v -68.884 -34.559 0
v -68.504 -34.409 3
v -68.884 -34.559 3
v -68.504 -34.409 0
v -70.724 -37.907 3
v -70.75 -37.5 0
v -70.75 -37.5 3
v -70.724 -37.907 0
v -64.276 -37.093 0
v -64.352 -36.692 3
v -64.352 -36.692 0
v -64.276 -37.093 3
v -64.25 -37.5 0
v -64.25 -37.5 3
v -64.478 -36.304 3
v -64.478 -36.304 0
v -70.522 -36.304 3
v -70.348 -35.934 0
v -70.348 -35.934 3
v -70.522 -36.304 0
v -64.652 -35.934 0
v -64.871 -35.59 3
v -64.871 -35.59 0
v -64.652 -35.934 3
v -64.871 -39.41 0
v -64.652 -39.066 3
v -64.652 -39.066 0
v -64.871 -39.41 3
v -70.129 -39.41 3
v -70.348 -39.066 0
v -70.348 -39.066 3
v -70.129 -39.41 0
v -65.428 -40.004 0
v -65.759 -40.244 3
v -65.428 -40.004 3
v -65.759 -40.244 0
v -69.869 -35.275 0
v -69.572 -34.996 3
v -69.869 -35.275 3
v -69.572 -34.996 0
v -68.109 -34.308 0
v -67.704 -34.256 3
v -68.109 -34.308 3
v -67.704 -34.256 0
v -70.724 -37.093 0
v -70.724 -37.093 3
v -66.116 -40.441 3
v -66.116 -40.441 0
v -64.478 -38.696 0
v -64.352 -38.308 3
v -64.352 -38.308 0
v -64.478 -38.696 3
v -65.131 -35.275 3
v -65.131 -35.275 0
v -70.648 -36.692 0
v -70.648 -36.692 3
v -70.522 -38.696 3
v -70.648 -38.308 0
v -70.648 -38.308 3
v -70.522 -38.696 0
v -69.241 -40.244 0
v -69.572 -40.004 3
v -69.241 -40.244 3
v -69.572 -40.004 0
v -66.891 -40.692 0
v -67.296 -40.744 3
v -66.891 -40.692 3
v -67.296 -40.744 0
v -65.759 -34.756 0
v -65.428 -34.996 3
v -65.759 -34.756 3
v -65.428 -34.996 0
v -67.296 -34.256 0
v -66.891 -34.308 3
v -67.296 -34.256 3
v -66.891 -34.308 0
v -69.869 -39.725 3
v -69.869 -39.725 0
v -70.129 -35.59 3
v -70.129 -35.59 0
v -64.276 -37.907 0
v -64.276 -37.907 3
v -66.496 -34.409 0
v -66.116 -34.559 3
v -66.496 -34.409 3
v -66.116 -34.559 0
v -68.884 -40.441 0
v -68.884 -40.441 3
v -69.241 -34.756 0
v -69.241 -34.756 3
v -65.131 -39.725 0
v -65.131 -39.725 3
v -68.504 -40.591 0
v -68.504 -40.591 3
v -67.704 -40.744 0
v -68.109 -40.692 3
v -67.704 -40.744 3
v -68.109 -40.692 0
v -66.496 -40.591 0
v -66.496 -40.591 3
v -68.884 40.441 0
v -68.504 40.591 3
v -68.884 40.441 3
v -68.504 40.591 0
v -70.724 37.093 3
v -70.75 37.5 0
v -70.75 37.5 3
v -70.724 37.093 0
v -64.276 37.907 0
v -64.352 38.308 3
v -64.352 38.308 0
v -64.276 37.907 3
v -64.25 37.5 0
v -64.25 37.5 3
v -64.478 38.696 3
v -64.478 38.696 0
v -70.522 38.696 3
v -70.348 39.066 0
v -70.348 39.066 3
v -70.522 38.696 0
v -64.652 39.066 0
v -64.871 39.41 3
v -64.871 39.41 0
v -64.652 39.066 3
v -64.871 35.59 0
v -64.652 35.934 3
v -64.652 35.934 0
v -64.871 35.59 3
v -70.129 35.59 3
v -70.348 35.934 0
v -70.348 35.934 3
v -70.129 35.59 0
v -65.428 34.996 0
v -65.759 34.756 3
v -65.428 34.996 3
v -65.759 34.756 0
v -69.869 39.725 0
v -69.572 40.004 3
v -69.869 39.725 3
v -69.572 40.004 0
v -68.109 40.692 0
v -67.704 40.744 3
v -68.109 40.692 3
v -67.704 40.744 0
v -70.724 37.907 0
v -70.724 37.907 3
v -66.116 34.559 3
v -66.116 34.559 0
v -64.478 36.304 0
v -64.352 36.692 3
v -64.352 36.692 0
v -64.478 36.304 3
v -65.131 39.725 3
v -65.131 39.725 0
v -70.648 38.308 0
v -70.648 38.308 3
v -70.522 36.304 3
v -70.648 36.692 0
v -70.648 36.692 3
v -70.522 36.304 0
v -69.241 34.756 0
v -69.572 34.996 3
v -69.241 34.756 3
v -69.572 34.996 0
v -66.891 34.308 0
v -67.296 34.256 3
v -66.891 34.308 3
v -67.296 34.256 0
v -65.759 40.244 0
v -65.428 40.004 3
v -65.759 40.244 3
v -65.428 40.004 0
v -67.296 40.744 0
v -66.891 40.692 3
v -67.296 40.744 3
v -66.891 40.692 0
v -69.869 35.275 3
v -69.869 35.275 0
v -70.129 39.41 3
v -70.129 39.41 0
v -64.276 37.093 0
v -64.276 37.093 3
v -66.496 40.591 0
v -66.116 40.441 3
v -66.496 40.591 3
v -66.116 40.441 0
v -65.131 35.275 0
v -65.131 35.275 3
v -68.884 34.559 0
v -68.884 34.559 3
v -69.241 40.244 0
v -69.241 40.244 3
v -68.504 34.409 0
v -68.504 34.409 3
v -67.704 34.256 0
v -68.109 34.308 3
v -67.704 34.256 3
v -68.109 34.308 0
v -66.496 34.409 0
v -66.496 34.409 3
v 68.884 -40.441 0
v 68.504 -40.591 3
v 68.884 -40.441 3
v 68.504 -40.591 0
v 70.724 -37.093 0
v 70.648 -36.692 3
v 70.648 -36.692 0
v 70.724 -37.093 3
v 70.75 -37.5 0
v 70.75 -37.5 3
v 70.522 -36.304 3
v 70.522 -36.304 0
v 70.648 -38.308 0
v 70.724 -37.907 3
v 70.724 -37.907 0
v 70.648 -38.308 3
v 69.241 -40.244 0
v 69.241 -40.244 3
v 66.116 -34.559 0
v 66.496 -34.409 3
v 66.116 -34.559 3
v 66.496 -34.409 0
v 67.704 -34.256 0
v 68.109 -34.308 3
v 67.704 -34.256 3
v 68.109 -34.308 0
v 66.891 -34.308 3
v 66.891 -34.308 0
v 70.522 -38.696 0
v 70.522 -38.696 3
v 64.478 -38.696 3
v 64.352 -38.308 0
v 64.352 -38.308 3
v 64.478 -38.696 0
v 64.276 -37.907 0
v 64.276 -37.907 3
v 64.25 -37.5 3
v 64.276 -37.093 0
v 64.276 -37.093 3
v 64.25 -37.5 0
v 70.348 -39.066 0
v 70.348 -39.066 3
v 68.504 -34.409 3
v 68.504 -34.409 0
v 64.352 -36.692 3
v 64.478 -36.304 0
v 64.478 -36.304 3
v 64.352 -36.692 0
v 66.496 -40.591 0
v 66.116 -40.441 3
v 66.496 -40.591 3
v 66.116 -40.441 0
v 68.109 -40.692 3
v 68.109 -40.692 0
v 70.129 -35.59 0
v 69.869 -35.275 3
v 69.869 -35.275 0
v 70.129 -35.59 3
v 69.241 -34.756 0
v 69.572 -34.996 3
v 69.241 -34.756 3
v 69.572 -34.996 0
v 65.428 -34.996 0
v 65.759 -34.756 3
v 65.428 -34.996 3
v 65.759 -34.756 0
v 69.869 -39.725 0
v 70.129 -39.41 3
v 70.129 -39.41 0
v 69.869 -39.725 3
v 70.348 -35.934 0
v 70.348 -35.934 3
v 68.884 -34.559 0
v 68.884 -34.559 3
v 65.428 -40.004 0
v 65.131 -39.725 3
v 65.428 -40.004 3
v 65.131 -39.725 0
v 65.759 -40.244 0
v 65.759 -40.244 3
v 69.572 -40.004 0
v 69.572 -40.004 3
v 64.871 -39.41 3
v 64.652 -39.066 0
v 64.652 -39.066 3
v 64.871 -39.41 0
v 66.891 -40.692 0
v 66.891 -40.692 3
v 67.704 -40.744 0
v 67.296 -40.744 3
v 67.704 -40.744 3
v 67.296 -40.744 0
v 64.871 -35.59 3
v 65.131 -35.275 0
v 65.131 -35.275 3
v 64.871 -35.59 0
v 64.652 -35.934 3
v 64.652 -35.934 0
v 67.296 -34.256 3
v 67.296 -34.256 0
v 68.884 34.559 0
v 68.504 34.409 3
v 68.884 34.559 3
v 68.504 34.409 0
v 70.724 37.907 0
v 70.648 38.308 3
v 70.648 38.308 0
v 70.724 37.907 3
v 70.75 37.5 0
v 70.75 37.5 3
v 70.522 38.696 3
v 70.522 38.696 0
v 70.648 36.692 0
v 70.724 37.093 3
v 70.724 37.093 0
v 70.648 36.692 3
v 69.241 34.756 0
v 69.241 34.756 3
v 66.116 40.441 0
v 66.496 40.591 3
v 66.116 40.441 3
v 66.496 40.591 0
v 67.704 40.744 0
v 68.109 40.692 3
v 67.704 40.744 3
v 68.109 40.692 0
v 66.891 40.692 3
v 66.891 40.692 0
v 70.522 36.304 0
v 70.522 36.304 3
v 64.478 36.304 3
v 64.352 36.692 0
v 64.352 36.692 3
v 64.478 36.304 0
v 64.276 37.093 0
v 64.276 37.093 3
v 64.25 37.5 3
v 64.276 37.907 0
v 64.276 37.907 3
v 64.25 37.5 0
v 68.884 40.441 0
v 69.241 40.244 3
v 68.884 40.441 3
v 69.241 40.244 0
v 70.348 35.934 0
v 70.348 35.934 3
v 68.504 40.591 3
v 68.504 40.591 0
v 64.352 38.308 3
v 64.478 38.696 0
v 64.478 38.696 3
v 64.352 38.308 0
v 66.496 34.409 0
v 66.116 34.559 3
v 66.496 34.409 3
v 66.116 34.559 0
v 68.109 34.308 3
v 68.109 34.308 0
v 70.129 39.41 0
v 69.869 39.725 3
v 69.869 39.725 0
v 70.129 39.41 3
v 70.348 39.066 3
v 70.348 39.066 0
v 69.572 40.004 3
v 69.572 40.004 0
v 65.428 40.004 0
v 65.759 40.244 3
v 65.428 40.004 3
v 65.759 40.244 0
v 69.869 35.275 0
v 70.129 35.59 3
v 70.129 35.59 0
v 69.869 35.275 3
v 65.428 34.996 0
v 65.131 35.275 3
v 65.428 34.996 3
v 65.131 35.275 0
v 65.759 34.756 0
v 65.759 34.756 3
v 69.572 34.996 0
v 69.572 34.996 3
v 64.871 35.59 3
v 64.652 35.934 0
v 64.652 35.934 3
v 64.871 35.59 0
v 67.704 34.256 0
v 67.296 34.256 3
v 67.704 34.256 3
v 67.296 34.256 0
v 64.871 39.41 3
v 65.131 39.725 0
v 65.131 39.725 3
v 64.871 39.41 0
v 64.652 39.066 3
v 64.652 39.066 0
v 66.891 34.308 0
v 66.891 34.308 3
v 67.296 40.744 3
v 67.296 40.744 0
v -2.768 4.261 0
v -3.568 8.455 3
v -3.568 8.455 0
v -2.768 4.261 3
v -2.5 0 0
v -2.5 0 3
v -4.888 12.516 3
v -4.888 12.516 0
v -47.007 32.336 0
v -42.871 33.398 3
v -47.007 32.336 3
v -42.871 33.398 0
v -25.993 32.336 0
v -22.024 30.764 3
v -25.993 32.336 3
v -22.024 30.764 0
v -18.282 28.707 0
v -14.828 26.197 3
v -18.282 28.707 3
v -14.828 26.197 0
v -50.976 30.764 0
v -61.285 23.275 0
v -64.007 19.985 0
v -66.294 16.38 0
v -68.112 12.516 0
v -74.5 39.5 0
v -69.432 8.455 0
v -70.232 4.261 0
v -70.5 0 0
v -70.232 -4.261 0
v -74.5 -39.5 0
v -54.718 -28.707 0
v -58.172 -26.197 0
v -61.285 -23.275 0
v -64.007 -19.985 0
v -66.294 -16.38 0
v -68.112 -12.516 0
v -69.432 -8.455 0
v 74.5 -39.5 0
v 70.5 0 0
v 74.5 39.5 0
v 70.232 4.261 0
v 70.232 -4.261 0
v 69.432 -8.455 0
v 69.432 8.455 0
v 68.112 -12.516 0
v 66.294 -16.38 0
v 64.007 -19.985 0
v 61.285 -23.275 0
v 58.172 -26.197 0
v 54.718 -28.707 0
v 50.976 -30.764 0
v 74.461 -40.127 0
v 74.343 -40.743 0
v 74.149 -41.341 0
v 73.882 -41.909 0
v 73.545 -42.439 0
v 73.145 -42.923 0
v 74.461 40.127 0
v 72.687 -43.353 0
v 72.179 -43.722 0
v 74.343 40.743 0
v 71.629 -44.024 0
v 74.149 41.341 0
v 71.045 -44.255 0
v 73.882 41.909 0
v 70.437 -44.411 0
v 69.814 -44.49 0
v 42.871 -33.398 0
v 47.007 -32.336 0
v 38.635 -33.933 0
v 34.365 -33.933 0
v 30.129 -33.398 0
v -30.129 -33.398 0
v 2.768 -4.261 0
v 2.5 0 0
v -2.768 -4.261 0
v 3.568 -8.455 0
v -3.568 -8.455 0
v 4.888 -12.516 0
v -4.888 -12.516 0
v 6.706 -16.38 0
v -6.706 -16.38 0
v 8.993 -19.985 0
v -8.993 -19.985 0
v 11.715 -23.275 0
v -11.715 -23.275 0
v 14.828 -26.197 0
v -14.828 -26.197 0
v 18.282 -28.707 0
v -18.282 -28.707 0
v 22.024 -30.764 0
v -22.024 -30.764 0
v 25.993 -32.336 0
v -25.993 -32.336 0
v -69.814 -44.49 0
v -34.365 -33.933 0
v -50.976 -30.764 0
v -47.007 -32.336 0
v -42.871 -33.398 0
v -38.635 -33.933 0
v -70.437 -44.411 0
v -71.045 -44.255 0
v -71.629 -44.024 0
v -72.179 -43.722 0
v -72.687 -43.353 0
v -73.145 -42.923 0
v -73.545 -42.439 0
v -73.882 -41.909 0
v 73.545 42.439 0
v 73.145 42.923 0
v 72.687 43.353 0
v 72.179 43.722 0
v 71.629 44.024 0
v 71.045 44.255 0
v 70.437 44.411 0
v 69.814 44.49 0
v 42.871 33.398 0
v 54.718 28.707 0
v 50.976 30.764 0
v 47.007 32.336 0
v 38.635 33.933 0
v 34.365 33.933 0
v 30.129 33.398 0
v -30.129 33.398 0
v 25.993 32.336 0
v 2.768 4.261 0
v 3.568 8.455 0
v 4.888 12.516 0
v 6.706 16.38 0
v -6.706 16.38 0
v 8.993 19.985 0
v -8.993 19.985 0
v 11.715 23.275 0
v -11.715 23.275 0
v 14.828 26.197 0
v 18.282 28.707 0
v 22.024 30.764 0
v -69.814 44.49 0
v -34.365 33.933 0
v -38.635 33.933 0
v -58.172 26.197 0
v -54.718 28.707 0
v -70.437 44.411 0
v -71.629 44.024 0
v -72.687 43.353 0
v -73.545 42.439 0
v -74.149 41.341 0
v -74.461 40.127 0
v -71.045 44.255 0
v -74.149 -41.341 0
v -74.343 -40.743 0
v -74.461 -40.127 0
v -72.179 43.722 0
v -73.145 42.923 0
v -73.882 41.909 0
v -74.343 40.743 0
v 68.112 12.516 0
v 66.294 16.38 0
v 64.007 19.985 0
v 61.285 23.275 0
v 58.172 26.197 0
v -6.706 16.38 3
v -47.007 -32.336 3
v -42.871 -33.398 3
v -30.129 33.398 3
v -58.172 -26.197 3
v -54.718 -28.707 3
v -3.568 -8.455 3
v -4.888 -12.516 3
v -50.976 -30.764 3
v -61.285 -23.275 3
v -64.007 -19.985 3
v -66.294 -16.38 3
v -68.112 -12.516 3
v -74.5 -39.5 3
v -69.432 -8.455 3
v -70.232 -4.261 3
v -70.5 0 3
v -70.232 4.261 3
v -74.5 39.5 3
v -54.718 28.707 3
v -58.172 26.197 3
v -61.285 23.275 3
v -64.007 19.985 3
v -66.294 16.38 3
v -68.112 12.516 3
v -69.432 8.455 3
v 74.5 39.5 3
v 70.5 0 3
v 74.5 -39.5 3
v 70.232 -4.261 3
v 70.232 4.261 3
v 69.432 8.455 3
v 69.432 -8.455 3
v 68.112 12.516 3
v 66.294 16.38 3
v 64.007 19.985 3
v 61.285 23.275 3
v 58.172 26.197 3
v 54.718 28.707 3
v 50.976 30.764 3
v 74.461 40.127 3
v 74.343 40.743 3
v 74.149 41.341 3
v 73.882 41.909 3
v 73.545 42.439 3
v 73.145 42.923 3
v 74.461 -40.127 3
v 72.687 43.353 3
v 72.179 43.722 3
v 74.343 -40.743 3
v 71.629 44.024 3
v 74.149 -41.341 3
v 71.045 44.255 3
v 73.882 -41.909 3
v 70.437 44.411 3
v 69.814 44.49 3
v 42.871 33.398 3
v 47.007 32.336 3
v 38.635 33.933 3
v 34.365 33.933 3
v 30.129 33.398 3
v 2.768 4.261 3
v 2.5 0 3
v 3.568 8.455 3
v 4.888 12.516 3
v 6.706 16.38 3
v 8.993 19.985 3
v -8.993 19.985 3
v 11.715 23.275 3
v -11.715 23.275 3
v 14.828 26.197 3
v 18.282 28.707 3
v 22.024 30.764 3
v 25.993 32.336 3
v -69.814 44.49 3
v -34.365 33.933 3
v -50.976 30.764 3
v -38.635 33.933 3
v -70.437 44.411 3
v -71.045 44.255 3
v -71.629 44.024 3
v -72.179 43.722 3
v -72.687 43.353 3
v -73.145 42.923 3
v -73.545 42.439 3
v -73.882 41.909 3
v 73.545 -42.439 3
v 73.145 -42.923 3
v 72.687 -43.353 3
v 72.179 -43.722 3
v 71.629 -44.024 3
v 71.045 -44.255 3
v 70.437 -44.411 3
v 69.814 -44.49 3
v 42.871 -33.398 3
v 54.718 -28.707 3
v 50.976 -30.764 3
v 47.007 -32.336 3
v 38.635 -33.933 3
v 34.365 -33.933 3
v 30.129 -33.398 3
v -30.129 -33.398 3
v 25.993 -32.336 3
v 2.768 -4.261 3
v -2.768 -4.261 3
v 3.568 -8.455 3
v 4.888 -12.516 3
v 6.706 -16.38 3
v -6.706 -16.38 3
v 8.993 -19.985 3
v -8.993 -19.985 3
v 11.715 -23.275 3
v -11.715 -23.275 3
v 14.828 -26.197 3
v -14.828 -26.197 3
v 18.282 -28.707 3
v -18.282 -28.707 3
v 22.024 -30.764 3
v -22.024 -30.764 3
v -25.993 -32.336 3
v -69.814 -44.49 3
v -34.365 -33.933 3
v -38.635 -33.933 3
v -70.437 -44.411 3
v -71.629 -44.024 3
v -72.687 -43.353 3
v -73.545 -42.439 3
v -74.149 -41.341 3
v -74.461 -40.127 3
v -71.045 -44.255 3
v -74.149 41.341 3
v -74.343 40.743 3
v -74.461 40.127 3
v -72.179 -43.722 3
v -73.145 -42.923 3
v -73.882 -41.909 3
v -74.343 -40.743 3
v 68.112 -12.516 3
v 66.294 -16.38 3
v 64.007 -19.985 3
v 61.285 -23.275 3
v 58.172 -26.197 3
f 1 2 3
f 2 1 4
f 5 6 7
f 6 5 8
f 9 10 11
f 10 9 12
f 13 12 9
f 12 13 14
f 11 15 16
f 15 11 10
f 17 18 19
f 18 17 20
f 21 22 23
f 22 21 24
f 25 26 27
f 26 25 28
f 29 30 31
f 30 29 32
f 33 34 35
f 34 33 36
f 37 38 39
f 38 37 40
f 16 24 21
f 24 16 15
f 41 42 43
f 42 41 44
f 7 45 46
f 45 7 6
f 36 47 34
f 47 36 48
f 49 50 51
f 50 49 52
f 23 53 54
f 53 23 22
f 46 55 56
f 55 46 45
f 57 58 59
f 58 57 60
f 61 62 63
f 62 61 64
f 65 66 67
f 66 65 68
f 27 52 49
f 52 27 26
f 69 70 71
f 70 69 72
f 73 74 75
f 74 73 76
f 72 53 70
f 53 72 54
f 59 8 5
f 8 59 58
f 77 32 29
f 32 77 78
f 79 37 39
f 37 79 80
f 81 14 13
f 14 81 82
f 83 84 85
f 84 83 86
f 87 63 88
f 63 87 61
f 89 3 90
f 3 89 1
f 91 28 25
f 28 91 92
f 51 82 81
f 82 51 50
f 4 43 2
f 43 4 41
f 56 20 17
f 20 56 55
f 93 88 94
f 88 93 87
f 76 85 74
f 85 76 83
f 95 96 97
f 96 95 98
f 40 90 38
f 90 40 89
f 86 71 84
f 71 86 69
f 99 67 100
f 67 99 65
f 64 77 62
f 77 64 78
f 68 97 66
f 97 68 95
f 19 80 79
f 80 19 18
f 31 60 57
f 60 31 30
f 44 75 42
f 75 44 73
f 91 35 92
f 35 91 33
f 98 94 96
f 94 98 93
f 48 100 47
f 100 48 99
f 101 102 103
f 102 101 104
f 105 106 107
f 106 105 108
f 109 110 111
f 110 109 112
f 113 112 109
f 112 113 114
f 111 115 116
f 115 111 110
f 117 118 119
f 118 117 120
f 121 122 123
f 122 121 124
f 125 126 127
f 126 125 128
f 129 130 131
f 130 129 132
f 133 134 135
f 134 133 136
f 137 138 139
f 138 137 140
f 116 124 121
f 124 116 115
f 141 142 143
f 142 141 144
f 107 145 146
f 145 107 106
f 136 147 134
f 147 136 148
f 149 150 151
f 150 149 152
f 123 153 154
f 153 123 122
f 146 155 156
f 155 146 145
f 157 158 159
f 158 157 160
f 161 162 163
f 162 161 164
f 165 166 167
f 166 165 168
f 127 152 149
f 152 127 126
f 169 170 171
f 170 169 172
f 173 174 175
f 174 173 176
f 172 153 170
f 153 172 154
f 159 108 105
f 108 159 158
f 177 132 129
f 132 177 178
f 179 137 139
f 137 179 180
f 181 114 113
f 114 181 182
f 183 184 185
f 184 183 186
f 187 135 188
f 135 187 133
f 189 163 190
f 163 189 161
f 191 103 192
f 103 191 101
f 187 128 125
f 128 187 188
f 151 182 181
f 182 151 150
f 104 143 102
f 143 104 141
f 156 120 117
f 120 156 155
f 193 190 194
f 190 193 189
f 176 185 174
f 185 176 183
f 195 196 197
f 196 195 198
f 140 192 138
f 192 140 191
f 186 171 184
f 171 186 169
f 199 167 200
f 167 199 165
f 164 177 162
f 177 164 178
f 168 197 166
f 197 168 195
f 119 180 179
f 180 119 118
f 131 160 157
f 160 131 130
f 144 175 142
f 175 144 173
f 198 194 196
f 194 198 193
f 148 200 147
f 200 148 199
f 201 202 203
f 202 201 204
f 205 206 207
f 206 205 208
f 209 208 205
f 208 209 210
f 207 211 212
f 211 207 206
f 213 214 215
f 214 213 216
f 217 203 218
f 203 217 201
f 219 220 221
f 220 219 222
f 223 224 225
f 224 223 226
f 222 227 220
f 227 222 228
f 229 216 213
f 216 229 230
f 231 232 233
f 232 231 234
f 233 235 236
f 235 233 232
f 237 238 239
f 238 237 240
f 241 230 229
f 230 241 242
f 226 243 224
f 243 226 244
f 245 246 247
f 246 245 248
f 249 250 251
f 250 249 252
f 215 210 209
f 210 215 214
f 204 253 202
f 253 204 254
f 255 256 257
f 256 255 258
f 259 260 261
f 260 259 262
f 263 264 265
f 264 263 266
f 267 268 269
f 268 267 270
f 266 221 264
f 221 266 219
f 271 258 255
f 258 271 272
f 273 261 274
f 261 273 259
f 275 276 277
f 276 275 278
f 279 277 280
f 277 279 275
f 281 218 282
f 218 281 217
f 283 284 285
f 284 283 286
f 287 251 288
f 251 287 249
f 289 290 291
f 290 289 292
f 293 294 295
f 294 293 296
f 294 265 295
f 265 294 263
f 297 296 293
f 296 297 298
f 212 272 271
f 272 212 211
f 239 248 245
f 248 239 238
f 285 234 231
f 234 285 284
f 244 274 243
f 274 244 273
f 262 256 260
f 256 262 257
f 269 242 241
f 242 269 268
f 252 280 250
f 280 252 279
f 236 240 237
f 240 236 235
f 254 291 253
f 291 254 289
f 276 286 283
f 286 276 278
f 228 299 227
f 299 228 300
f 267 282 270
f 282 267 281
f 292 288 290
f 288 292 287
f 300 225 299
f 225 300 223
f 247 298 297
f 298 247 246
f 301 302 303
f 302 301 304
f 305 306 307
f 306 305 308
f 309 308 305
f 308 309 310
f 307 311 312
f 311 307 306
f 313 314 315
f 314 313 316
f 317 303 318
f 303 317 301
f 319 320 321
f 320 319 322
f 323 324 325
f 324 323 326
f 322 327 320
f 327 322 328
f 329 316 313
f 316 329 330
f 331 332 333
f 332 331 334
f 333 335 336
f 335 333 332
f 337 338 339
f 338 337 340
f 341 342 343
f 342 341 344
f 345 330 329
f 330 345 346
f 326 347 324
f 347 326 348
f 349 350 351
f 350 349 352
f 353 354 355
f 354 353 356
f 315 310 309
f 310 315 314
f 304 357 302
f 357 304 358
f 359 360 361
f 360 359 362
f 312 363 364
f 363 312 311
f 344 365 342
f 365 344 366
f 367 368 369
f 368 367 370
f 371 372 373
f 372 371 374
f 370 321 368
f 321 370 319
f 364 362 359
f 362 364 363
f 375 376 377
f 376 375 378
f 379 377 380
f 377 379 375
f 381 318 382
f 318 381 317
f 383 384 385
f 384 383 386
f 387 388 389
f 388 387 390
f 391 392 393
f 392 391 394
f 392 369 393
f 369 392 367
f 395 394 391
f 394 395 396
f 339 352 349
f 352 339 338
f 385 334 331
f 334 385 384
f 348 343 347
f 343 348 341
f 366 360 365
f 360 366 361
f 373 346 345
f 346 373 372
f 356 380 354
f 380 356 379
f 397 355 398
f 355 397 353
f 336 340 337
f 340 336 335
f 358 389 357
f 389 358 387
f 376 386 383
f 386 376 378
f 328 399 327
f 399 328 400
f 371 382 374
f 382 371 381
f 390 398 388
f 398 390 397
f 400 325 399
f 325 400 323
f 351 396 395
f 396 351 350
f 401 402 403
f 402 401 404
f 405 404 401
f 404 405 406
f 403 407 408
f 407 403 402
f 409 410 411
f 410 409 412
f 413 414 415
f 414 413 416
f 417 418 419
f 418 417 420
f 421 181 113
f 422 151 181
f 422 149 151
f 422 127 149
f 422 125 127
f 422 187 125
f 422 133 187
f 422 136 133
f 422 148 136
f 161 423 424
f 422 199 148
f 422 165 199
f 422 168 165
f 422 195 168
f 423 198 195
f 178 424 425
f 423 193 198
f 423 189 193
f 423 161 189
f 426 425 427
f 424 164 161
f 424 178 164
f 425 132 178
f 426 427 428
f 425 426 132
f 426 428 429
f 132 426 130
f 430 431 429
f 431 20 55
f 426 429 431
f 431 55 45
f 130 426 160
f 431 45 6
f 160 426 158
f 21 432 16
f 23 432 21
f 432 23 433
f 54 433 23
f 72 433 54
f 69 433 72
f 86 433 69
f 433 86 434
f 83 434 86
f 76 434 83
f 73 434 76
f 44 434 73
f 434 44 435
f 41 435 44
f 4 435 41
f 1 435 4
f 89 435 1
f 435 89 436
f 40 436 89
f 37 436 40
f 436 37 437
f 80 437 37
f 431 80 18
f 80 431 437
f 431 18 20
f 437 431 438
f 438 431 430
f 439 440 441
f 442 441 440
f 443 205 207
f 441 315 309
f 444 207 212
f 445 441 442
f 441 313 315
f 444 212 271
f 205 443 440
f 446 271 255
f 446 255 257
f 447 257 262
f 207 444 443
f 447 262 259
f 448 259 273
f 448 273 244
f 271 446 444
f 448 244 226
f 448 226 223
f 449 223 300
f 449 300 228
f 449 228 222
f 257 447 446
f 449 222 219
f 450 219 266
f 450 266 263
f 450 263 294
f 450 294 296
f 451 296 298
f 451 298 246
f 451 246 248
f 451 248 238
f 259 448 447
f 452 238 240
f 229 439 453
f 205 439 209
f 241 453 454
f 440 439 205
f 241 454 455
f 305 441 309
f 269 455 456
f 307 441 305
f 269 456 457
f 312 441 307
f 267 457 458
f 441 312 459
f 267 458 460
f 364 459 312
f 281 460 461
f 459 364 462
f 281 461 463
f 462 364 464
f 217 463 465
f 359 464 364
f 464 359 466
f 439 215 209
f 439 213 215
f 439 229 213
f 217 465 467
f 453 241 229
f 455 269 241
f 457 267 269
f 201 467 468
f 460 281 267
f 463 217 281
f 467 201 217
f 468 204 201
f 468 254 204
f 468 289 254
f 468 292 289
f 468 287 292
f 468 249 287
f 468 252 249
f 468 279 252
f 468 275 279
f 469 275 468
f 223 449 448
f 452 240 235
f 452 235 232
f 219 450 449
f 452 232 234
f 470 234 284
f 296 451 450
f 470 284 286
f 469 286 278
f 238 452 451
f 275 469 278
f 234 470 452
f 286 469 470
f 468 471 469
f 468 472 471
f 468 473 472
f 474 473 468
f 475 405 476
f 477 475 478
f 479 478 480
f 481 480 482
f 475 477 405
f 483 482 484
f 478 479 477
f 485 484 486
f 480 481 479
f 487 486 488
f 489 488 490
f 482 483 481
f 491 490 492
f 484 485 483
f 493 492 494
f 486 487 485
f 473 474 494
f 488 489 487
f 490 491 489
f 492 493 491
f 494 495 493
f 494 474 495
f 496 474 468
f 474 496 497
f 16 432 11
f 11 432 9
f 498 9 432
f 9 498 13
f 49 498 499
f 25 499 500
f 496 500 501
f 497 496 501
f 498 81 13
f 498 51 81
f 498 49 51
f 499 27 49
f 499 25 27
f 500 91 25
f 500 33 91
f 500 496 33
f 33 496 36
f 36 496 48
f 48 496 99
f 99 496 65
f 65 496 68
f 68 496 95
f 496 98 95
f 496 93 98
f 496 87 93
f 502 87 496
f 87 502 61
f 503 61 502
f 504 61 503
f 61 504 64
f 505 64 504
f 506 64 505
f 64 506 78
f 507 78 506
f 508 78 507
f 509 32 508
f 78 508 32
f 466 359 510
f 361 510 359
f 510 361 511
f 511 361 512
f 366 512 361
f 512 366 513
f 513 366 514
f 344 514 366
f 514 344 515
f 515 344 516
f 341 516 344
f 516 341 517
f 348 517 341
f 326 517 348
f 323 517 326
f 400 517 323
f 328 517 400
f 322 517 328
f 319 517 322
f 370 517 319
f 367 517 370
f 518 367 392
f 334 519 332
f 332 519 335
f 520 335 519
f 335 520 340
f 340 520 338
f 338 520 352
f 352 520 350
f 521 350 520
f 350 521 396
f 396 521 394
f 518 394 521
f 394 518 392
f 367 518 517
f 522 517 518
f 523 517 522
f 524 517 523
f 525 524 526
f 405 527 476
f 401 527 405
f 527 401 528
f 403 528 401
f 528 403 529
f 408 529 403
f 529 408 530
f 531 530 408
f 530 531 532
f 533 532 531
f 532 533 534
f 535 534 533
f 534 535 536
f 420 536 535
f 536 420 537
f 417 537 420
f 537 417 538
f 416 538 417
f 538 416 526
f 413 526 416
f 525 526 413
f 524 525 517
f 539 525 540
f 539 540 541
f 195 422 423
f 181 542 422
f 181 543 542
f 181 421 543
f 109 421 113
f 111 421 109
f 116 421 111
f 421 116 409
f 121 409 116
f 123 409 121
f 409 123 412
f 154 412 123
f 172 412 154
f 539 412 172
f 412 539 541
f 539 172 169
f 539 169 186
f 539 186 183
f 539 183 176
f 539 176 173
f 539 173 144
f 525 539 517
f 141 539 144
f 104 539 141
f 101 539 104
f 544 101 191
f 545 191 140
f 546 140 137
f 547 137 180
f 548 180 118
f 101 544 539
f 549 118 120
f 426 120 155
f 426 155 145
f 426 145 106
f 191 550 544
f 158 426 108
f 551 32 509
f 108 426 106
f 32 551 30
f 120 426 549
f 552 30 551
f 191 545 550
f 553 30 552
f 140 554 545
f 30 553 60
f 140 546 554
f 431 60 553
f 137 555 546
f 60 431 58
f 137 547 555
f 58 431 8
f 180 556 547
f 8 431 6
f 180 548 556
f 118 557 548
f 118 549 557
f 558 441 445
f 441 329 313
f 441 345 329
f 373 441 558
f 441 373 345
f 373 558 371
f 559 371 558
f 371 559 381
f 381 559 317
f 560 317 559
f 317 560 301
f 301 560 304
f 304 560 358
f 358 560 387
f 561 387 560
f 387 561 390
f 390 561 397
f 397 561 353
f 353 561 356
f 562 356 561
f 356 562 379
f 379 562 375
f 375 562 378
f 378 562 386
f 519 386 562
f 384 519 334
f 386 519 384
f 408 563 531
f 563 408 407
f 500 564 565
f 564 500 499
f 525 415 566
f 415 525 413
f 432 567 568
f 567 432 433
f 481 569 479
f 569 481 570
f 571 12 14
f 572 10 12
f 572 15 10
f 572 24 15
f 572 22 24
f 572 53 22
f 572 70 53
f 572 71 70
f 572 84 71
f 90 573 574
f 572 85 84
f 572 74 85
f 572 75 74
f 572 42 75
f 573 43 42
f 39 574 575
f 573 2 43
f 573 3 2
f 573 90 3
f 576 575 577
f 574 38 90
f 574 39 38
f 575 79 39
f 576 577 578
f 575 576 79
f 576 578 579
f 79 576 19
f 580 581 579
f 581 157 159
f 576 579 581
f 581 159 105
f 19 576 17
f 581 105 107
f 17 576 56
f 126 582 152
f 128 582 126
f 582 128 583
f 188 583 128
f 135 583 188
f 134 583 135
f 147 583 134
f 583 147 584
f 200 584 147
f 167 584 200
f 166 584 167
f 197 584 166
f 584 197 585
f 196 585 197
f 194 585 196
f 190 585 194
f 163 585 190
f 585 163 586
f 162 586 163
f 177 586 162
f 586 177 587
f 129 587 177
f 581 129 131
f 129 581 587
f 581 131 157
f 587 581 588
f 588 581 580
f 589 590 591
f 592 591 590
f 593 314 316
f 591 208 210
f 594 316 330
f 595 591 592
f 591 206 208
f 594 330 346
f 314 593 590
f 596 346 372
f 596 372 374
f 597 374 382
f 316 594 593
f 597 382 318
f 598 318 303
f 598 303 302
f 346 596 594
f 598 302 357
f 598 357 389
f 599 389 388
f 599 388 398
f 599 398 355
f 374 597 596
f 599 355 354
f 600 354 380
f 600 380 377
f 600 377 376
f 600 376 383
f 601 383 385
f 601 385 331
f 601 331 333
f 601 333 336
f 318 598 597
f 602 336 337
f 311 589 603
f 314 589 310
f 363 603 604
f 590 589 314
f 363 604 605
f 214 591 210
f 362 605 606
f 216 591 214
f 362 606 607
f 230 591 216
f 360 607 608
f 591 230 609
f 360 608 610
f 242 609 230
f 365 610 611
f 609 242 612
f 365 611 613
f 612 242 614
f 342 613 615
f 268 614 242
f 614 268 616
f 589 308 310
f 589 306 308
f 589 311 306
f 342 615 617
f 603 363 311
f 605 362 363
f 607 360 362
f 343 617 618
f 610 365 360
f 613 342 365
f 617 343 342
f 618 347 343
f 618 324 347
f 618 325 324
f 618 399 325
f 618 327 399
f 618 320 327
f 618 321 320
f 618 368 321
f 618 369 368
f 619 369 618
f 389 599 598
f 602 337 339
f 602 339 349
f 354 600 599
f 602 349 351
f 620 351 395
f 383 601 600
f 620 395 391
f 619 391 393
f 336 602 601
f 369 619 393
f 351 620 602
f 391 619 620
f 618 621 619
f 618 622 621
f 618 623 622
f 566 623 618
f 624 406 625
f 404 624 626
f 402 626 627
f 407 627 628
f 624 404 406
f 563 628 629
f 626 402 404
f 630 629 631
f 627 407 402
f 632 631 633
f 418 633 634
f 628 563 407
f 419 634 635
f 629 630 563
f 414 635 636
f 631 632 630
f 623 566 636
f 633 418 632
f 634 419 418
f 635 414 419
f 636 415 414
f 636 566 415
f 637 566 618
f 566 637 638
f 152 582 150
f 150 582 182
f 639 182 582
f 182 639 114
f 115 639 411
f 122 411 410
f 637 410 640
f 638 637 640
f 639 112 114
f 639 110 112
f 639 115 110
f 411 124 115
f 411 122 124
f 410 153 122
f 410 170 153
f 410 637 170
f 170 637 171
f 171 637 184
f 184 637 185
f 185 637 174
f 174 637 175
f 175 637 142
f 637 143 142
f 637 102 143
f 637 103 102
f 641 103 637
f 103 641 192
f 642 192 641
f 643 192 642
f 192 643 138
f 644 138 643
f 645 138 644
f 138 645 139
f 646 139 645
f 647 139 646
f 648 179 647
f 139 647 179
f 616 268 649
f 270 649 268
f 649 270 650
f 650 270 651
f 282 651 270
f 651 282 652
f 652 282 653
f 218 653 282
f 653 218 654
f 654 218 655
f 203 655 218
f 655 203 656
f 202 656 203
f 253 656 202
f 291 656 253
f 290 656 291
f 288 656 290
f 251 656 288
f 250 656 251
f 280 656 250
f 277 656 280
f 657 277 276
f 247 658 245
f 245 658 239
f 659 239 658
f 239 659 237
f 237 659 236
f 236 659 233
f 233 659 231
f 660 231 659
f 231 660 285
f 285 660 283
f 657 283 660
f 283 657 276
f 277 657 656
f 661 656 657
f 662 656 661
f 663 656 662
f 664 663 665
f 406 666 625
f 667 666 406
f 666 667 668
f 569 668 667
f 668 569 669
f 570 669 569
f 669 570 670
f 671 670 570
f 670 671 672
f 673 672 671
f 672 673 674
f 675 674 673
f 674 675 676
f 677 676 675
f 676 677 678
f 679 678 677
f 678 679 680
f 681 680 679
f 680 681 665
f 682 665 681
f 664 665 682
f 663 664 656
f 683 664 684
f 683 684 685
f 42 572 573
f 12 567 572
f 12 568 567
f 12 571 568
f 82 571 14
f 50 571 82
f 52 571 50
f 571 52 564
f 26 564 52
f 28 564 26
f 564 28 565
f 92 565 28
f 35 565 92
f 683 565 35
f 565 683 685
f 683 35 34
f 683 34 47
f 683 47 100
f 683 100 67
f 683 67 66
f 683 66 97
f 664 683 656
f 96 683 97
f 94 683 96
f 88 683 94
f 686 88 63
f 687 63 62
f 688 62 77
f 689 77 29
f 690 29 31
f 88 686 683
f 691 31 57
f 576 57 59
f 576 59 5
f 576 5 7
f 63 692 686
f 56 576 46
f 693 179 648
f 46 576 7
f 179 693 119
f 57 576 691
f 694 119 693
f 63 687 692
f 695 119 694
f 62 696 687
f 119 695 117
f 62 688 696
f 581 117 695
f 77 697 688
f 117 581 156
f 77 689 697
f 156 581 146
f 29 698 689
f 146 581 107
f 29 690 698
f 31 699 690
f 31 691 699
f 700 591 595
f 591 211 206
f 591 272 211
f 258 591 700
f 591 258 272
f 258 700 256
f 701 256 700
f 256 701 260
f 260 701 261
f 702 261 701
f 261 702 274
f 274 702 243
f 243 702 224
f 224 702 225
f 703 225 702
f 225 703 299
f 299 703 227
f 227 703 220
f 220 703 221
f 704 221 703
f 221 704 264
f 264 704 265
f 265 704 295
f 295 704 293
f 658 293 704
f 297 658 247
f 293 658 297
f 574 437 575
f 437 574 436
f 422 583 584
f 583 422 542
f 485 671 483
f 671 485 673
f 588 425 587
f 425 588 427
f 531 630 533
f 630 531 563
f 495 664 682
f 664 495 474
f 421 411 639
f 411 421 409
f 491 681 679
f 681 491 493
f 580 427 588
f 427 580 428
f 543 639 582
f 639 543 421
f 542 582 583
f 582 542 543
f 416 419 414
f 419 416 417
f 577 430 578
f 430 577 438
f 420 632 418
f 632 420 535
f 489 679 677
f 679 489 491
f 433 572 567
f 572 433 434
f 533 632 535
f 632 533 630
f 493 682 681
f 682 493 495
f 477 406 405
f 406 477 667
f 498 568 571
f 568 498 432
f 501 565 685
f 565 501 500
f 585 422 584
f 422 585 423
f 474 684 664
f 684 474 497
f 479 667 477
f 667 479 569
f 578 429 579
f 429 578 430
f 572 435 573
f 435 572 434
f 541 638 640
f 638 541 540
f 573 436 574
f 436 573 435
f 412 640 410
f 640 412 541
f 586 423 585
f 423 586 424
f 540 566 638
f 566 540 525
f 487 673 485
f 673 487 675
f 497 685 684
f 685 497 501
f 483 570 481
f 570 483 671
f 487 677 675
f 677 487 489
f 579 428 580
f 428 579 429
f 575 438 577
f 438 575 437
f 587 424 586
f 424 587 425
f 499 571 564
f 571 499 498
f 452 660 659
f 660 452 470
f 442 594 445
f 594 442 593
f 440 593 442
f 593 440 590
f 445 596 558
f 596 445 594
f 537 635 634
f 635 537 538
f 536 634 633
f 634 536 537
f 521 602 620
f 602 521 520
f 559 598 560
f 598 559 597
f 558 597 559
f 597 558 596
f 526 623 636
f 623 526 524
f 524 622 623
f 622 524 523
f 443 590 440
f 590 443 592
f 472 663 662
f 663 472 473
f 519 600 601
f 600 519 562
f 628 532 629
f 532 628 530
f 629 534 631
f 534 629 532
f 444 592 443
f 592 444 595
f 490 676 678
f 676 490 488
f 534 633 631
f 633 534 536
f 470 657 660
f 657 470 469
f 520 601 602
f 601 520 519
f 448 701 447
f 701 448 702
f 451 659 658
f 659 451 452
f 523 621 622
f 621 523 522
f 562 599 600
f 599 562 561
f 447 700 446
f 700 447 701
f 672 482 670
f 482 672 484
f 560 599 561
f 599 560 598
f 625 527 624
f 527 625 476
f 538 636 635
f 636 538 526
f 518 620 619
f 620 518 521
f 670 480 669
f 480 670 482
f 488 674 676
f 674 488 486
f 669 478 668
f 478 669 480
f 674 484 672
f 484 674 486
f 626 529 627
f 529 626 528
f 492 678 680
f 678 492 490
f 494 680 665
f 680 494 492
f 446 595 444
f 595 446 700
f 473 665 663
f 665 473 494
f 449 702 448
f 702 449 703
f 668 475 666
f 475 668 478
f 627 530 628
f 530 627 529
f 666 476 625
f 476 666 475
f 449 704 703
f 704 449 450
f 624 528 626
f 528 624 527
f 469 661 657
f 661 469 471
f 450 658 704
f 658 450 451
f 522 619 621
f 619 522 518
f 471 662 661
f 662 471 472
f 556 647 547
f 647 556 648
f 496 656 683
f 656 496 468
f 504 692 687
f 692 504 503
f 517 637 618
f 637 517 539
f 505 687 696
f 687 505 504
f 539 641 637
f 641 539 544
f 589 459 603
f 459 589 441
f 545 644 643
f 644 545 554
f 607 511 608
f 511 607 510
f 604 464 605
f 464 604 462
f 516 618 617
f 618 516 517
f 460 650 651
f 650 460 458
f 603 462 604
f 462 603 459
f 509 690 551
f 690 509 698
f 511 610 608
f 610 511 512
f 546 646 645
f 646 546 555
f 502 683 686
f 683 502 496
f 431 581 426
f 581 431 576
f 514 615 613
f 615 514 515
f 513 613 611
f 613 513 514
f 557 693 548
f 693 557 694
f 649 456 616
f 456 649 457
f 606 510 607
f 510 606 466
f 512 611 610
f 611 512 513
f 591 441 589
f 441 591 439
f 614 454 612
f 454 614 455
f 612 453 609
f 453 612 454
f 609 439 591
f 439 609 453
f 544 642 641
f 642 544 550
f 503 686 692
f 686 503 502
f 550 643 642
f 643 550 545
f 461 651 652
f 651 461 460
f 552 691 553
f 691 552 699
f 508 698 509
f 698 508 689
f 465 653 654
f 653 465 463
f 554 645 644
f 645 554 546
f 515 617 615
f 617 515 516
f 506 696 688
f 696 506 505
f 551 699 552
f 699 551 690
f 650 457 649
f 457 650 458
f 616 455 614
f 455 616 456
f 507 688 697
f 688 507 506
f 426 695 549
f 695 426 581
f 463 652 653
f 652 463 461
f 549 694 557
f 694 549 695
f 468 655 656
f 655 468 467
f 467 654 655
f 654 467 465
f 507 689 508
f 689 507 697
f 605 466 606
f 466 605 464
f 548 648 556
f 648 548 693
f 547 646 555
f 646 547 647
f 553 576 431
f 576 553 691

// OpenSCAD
$fn = 50;


difference() {
	union() {
		hull() {
			translate(v = [-69.5000000000, 39.5000000000, 0]) {
				cylinder(h = 3, r = 5);
			}
			translate(v = [69.5000000000, 39.5000000000, 0]) {
				cylinder(h = 3, r = 5);
			}
			translate(v = [-69.5000000000, -39.5000000000, 0]) {
				cylinder(h = 3, r = 5);
			}
			translate(v = [69.5000000000, -39.5000000000, 0]) {
				cylinder(h = 3, r = 5);
			}
		}
	}
	union() {
		#translate(v = [-67.5000000000, -37.5000000000, -100.0000000000]) {
			cylinder(h = 200, r = 3.2500000000);
		}
		#translate(v = [-67.5000000000, 37.5000000000, -100.0000000000]) {
			cylinder(h = 200, r = 3.2500000000);
		}
		#translate(v = [67.5000000000, -37.5000000000, -100.0000000000]) {
			cylinder(h = 200, r = 3.2500000000);
		}
		#translate(v = [67.5000000000, 37.5000000000, -100.0000000000]) {
			cylinder(h = 200, r = 3.2500000000);
		}
		#translate(v = [-36.5000000000, 0, 0]) {
			cylinder(h = 3, r = 34.0000000000);
		}
		#translate(v = [36.5000000000, 0, 0]) {
			cylinder(h = 3, r = 34.0000000000);
		}
	}
}
